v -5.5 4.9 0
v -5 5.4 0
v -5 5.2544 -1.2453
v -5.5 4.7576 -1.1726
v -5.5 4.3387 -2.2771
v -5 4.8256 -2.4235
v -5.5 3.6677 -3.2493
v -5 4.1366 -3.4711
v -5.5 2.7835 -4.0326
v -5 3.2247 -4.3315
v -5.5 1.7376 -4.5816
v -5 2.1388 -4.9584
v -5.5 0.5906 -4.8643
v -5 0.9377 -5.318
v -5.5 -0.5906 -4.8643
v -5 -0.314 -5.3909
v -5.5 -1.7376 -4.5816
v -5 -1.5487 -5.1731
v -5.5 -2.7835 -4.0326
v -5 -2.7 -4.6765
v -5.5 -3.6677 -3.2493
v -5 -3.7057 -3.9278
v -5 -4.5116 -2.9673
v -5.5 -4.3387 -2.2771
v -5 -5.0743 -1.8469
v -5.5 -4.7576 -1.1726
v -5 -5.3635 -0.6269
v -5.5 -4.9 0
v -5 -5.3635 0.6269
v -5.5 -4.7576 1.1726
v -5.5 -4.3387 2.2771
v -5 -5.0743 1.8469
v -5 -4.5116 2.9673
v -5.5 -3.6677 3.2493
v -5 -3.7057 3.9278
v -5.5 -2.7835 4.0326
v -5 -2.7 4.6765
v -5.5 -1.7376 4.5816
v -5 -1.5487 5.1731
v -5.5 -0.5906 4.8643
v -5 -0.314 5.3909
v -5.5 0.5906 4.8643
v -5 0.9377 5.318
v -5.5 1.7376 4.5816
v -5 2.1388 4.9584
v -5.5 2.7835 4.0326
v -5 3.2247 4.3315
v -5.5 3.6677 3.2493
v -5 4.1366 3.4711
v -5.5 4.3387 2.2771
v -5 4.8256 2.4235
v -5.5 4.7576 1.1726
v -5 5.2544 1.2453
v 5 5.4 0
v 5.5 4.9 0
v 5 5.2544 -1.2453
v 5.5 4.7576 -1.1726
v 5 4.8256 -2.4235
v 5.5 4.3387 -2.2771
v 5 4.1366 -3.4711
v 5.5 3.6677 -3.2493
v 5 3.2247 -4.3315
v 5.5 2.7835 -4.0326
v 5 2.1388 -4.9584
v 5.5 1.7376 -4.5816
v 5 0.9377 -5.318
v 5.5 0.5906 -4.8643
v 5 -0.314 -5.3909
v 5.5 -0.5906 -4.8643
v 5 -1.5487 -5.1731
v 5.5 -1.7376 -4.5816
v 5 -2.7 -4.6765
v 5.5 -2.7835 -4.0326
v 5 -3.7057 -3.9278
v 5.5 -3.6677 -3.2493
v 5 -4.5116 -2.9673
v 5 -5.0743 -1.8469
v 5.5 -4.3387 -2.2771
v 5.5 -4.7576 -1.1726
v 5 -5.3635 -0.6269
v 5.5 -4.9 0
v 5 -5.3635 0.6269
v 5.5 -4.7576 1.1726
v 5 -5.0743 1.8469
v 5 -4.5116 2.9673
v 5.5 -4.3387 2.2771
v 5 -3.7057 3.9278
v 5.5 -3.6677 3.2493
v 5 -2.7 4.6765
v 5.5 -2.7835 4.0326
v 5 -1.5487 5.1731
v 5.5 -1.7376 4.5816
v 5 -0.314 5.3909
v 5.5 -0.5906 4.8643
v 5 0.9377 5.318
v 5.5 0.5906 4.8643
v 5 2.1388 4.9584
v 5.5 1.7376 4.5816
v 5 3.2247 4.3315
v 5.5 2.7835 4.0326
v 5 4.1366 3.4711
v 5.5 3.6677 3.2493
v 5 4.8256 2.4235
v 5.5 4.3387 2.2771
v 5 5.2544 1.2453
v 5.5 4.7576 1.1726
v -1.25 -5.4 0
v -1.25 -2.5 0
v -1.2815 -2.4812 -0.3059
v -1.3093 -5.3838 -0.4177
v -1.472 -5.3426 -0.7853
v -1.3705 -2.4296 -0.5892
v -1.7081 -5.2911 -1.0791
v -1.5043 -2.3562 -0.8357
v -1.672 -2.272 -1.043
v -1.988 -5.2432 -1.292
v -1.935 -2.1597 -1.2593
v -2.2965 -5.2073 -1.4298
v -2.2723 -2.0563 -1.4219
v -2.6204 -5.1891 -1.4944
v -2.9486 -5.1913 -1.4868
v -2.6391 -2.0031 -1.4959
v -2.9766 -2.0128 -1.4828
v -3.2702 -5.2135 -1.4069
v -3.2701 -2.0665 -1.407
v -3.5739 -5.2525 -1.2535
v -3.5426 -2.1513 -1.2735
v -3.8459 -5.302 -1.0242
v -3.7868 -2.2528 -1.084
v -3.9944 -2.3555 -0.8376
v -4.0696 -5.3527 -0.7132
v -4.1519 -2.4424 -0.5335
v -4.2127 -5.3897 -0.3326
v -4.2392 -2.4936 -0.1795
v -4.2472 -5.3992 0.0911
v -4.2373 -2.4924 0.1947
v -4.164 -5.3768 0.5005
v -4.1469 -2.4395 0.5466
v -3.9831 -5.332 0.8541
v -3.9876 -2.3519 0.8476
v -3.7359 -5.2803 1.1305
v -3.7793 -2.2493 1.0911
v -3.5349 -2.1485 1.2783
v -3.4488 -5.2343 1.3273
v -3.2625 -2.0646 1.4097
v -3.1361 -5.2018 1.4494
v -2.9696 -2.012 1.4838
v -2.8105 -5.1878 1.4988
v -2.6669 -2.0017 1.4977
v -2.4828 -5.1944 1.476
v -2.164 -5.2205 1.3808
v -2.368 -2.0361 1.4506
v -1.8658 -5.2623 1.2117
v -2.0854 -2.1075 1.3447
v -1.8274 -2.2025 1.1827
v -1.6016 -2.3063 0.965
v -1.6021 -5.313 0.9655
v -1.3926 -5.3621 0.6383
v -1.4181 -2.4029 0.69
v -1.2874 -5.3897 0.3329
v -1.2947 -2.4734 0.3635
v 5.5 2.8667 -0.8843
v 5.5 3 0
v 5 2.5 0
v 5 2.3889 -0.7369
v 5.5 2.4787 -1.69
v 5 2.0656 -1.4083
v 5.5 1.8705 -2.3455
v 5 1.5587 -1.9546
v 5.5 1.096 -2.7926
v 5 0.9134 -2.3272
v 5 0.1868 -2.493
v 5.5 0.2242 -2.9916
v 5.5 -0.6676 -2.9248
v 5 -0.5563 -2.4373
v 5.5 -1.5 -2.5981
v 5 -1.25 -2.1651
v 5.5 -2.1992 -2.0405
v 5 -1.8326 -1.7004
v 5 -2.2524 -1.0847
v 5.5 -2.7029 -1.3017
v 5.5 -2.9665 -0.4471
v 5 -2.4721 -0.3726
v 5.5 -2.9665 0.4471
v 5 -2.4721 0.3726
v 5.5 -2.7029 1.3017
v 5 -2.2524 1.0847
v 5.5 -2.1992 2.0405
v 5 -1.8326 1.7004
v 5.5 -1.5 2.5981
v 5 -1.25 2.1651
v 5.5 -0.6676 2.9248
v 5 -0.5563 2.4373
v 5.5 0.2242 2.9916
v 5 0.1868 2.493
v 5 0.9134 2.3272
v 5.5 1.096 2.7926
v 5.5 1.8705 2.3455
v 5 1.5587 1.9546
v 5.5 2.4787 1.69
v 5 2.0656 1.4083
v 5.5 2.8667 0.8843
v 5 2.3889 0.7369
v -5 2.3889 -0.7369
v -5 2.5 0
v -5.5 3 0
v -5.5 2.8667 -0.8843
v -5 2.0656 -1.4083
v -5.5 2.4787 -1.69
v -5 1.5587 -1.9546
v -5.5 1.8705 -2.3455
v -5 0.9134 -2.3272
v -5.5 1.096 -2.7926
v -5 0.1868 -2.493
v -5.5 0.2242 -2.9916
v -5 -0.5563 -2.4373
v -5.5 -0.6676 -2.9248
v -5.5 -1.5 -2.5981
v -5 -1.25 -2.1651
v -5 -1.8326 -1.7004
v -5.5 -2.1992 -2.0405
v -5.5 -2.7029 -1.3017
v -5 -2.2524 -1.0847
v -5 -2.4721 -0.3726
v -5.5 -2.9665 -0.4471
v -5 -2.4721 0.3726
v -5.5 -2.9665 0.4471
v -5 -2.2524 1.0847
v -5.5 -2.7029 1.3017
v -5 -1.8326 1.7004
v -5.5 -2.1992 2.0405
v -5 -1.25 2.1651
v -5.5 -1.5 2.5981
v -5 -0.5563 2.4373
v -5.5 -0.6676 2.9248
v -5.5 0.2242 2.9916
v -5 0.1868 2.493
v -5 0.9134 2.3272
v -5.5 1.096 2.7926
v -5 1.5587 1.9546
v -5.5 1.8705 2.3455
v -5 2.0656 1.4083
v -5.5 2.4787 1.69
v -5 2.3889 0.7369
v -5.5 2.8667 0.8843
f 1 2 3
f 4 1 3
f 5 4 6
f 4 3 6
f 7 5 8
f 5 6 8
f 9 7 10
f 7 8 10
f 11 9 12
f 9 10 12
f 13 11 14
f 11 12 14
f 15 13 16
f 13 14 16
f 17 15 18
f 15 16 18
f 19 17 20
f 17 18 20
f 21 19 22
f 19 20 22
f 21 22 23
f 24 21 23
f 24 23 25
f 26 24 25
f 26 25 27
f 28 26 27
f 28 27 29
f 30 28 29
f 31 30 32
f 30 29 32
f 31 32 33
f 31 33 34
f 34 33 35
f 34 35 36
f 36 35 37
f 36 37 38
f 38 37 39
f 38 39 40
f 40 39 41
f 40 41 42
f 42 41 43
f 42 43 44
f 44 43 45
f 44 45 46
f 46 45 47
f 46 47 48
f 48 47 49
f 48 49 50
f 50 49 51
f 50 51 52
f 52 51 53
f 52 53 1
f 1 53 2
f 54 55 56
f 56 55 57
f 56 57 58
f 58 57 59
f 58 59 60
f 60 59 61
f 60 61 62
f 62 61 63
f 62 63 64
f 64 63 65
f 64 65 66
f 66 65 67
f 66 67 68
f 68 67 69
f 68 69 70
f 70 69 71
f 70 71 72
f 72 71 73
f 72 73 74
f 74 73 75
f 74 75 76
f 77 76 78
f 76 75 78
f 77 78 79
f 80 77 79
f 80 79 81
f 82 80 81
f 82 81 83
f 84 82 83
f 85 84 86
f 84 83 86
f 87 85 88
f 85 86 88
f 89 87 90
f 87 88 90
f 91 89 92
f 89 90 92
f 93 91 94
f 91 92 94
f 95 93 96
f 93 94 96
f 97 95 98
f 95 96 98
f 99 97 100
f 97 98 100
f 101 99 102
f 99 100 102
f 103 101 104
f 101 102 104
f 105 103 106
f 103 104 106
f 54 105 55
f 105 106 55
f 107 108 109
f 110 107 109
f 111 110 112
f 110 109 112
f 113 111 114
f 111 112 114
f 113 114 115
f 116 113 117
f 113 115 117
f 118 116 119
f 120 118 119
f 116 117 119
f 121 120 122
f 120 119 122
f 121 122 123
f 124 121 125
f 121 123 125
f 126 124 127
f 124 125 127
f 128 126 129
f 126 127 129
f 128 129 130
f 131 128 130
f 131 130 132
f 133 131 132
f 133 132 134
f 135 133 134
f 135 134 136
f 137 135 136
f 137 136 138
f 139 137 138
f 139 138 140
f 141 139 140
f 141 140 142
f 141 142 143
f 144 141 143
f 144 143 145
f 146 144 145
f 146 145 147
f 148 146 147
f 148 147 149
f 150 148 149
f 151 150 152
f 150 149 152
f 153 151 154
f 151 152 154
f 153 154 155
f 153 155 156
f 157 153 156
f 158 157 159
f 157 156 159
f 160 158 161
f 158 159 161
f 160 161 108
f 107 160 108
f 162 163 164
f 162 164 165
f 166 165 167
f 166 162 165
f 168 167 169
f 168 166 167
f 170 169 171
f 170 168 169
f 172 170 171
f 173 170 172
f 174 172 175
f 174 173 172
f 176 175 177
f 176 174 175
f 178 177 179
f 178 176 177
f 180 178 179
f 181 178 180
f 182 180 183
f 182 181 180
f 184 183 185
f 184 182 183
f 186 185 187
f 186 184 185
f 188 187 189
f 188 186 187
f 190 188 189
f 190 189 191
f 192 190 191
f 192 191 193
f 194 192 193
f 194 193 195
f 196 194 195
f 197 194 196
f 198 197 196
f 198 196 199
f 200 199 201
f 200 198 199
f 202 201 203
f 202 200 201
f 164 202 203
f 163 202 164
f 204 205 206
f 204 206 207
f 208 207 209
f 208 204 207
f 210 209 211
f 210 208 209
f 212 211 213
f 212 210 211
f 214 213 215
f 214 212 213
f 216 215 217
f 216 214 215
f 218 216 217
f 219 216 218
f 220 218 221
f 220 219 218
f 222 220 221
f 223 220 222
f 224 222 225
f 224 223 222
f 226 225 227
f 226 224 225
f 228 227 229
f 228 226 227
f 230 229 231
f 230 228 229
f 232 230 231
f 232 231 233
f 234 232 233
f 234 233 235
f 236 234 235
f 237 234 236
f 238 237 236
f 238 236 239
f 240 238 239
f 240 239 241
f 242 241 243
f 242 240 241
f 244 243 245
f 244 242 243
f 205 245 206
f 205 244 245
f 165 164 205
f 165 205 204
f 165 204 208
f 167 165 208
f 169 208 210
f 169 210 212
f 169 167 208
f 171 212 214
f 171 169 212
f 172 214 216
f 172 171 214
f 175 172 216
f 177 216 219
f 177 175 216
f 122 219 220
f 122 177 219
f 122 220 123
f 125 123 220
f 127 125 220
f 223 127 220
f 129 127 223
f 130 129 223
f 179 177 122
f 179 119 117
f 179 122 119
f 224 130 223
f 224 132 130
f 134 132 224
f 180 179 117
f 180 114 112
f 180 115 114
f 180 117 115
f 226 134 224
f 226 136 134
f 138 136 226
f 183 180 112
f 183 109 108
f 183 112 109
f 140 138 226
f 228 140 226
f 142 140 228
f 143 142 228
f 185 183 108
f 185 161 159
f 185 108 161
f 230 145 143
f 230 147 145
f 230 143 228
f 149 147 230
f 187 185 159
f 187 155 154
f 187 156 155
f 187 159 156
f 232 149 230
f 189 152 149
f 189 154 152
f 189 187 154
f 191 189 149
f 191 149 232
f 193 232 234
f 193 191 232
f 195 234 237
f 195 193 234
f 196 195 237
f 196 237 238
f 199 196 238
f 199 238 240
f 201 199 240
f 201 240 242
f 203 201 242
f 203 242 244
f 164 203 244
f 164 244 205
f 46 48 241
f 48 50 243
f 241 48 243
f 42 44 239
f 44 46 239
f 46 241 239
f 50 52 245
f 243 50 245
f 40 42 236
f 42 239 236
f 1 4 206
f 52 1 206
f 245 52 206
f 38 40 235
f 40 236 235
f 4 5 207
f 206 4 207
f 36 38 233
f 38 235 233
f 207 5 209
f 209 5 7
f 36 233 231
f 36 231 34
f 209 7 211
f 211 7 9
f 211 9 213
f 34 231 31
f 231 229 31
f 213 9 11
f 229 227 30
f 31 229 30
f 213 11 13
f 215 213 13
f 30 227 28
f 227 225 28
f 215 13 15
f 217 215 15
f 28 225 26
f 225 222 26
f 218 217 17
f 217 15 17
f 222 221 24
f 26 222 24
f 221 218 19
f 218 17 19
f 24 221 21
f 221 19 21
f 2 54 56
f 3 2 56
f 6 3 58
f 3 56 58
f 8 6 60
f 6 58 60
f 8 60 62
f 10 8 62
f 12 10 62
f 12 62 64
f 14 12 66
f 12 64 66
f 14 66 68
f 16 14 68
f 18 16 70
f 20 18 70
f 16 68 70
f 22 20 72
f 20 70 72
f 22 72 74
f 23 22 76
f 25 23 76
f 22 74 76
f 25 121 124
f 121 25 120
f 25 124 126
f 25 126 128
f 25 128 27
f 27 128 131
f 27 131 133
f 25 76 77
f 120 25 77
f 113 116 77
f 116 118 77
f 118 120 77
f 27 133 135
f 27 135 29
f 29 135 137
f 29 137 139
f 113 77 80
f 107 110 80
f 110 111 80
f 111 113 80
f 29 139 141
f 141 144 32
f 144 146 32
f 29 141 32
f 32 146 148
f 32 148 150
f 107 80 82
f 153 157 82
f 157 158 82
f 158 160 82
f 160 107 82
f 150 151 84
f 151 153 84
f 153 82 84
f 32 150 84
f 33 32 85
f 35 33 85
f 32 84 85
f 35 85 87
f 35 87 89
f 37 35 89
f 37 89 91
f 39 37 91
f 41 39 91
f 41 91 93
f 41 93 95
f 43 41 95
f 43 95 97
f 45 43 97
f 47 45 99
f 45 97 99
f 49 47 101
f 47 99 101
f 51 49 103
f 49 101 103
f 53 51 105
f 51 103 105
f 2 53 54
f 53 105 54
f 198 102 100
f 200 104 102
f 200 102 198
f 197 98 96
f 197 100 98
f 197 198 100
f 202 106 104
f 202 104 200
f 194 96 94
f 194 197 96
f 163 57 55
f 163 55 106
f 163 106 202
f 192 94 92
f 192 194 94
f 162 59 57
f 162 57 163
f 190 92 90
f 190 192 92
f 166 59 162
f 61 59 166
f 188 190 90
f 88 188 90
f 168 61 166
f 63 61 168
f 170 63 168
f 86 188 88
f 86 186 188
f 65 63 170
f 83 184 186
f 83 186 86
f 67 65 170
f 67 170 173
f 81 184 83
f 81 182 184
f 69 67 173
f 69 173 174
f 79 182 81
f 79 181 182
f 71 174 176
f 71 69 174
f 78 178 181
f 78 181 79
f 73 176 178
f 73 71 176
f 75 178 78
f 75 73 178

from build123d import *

# Parameters (mm, degrees)
SKETCH1_W          = 11
SKETCH1_H          = 2.9
SKETCH2_R          = 1.5
CUT_EXTRUDE1_DEPTH = 10
CHAMFER1_SIZE      = 0.5


with BuildPart() as part:
    # Sketch1 → Revolve1 (revolve)
    with BuildSketch(Plane.XY):
        with Locations((0, 3.95)):
            Rectangle(SKETCH1_W, SKETCH1_H)
    revolve(axis=Axis((0, 0, 0), (-1, 0, 0)))

    # Sketch2 → Cut-Extrude1 (cut)
    with BuildSketch(Plane(origin=(0, 0, 0), x_dir=(1, 0, 0), z_dir=(0, 1, 0))):
        with Locations((-2.75, 0)):
            Circle(SKETCH2_R)
    extrude(amount=-CUT_EXTRUDE1_DEPTH, mode=Mode.SUBTRACT)

    # Chamfer1
    chamfer1_edges = [part.edges().sort_by_distance(p)[0] for p in [
        (-5.5, -5.4, 0),
        (5.5, -5.4, 0),
        (5.5, -2.5, 0),
        (-5.5, -2.5, 0),
    ]]
    chamfer(chamfer1_edges, length=CHAMFER1_SIZE)


solid = part.part
